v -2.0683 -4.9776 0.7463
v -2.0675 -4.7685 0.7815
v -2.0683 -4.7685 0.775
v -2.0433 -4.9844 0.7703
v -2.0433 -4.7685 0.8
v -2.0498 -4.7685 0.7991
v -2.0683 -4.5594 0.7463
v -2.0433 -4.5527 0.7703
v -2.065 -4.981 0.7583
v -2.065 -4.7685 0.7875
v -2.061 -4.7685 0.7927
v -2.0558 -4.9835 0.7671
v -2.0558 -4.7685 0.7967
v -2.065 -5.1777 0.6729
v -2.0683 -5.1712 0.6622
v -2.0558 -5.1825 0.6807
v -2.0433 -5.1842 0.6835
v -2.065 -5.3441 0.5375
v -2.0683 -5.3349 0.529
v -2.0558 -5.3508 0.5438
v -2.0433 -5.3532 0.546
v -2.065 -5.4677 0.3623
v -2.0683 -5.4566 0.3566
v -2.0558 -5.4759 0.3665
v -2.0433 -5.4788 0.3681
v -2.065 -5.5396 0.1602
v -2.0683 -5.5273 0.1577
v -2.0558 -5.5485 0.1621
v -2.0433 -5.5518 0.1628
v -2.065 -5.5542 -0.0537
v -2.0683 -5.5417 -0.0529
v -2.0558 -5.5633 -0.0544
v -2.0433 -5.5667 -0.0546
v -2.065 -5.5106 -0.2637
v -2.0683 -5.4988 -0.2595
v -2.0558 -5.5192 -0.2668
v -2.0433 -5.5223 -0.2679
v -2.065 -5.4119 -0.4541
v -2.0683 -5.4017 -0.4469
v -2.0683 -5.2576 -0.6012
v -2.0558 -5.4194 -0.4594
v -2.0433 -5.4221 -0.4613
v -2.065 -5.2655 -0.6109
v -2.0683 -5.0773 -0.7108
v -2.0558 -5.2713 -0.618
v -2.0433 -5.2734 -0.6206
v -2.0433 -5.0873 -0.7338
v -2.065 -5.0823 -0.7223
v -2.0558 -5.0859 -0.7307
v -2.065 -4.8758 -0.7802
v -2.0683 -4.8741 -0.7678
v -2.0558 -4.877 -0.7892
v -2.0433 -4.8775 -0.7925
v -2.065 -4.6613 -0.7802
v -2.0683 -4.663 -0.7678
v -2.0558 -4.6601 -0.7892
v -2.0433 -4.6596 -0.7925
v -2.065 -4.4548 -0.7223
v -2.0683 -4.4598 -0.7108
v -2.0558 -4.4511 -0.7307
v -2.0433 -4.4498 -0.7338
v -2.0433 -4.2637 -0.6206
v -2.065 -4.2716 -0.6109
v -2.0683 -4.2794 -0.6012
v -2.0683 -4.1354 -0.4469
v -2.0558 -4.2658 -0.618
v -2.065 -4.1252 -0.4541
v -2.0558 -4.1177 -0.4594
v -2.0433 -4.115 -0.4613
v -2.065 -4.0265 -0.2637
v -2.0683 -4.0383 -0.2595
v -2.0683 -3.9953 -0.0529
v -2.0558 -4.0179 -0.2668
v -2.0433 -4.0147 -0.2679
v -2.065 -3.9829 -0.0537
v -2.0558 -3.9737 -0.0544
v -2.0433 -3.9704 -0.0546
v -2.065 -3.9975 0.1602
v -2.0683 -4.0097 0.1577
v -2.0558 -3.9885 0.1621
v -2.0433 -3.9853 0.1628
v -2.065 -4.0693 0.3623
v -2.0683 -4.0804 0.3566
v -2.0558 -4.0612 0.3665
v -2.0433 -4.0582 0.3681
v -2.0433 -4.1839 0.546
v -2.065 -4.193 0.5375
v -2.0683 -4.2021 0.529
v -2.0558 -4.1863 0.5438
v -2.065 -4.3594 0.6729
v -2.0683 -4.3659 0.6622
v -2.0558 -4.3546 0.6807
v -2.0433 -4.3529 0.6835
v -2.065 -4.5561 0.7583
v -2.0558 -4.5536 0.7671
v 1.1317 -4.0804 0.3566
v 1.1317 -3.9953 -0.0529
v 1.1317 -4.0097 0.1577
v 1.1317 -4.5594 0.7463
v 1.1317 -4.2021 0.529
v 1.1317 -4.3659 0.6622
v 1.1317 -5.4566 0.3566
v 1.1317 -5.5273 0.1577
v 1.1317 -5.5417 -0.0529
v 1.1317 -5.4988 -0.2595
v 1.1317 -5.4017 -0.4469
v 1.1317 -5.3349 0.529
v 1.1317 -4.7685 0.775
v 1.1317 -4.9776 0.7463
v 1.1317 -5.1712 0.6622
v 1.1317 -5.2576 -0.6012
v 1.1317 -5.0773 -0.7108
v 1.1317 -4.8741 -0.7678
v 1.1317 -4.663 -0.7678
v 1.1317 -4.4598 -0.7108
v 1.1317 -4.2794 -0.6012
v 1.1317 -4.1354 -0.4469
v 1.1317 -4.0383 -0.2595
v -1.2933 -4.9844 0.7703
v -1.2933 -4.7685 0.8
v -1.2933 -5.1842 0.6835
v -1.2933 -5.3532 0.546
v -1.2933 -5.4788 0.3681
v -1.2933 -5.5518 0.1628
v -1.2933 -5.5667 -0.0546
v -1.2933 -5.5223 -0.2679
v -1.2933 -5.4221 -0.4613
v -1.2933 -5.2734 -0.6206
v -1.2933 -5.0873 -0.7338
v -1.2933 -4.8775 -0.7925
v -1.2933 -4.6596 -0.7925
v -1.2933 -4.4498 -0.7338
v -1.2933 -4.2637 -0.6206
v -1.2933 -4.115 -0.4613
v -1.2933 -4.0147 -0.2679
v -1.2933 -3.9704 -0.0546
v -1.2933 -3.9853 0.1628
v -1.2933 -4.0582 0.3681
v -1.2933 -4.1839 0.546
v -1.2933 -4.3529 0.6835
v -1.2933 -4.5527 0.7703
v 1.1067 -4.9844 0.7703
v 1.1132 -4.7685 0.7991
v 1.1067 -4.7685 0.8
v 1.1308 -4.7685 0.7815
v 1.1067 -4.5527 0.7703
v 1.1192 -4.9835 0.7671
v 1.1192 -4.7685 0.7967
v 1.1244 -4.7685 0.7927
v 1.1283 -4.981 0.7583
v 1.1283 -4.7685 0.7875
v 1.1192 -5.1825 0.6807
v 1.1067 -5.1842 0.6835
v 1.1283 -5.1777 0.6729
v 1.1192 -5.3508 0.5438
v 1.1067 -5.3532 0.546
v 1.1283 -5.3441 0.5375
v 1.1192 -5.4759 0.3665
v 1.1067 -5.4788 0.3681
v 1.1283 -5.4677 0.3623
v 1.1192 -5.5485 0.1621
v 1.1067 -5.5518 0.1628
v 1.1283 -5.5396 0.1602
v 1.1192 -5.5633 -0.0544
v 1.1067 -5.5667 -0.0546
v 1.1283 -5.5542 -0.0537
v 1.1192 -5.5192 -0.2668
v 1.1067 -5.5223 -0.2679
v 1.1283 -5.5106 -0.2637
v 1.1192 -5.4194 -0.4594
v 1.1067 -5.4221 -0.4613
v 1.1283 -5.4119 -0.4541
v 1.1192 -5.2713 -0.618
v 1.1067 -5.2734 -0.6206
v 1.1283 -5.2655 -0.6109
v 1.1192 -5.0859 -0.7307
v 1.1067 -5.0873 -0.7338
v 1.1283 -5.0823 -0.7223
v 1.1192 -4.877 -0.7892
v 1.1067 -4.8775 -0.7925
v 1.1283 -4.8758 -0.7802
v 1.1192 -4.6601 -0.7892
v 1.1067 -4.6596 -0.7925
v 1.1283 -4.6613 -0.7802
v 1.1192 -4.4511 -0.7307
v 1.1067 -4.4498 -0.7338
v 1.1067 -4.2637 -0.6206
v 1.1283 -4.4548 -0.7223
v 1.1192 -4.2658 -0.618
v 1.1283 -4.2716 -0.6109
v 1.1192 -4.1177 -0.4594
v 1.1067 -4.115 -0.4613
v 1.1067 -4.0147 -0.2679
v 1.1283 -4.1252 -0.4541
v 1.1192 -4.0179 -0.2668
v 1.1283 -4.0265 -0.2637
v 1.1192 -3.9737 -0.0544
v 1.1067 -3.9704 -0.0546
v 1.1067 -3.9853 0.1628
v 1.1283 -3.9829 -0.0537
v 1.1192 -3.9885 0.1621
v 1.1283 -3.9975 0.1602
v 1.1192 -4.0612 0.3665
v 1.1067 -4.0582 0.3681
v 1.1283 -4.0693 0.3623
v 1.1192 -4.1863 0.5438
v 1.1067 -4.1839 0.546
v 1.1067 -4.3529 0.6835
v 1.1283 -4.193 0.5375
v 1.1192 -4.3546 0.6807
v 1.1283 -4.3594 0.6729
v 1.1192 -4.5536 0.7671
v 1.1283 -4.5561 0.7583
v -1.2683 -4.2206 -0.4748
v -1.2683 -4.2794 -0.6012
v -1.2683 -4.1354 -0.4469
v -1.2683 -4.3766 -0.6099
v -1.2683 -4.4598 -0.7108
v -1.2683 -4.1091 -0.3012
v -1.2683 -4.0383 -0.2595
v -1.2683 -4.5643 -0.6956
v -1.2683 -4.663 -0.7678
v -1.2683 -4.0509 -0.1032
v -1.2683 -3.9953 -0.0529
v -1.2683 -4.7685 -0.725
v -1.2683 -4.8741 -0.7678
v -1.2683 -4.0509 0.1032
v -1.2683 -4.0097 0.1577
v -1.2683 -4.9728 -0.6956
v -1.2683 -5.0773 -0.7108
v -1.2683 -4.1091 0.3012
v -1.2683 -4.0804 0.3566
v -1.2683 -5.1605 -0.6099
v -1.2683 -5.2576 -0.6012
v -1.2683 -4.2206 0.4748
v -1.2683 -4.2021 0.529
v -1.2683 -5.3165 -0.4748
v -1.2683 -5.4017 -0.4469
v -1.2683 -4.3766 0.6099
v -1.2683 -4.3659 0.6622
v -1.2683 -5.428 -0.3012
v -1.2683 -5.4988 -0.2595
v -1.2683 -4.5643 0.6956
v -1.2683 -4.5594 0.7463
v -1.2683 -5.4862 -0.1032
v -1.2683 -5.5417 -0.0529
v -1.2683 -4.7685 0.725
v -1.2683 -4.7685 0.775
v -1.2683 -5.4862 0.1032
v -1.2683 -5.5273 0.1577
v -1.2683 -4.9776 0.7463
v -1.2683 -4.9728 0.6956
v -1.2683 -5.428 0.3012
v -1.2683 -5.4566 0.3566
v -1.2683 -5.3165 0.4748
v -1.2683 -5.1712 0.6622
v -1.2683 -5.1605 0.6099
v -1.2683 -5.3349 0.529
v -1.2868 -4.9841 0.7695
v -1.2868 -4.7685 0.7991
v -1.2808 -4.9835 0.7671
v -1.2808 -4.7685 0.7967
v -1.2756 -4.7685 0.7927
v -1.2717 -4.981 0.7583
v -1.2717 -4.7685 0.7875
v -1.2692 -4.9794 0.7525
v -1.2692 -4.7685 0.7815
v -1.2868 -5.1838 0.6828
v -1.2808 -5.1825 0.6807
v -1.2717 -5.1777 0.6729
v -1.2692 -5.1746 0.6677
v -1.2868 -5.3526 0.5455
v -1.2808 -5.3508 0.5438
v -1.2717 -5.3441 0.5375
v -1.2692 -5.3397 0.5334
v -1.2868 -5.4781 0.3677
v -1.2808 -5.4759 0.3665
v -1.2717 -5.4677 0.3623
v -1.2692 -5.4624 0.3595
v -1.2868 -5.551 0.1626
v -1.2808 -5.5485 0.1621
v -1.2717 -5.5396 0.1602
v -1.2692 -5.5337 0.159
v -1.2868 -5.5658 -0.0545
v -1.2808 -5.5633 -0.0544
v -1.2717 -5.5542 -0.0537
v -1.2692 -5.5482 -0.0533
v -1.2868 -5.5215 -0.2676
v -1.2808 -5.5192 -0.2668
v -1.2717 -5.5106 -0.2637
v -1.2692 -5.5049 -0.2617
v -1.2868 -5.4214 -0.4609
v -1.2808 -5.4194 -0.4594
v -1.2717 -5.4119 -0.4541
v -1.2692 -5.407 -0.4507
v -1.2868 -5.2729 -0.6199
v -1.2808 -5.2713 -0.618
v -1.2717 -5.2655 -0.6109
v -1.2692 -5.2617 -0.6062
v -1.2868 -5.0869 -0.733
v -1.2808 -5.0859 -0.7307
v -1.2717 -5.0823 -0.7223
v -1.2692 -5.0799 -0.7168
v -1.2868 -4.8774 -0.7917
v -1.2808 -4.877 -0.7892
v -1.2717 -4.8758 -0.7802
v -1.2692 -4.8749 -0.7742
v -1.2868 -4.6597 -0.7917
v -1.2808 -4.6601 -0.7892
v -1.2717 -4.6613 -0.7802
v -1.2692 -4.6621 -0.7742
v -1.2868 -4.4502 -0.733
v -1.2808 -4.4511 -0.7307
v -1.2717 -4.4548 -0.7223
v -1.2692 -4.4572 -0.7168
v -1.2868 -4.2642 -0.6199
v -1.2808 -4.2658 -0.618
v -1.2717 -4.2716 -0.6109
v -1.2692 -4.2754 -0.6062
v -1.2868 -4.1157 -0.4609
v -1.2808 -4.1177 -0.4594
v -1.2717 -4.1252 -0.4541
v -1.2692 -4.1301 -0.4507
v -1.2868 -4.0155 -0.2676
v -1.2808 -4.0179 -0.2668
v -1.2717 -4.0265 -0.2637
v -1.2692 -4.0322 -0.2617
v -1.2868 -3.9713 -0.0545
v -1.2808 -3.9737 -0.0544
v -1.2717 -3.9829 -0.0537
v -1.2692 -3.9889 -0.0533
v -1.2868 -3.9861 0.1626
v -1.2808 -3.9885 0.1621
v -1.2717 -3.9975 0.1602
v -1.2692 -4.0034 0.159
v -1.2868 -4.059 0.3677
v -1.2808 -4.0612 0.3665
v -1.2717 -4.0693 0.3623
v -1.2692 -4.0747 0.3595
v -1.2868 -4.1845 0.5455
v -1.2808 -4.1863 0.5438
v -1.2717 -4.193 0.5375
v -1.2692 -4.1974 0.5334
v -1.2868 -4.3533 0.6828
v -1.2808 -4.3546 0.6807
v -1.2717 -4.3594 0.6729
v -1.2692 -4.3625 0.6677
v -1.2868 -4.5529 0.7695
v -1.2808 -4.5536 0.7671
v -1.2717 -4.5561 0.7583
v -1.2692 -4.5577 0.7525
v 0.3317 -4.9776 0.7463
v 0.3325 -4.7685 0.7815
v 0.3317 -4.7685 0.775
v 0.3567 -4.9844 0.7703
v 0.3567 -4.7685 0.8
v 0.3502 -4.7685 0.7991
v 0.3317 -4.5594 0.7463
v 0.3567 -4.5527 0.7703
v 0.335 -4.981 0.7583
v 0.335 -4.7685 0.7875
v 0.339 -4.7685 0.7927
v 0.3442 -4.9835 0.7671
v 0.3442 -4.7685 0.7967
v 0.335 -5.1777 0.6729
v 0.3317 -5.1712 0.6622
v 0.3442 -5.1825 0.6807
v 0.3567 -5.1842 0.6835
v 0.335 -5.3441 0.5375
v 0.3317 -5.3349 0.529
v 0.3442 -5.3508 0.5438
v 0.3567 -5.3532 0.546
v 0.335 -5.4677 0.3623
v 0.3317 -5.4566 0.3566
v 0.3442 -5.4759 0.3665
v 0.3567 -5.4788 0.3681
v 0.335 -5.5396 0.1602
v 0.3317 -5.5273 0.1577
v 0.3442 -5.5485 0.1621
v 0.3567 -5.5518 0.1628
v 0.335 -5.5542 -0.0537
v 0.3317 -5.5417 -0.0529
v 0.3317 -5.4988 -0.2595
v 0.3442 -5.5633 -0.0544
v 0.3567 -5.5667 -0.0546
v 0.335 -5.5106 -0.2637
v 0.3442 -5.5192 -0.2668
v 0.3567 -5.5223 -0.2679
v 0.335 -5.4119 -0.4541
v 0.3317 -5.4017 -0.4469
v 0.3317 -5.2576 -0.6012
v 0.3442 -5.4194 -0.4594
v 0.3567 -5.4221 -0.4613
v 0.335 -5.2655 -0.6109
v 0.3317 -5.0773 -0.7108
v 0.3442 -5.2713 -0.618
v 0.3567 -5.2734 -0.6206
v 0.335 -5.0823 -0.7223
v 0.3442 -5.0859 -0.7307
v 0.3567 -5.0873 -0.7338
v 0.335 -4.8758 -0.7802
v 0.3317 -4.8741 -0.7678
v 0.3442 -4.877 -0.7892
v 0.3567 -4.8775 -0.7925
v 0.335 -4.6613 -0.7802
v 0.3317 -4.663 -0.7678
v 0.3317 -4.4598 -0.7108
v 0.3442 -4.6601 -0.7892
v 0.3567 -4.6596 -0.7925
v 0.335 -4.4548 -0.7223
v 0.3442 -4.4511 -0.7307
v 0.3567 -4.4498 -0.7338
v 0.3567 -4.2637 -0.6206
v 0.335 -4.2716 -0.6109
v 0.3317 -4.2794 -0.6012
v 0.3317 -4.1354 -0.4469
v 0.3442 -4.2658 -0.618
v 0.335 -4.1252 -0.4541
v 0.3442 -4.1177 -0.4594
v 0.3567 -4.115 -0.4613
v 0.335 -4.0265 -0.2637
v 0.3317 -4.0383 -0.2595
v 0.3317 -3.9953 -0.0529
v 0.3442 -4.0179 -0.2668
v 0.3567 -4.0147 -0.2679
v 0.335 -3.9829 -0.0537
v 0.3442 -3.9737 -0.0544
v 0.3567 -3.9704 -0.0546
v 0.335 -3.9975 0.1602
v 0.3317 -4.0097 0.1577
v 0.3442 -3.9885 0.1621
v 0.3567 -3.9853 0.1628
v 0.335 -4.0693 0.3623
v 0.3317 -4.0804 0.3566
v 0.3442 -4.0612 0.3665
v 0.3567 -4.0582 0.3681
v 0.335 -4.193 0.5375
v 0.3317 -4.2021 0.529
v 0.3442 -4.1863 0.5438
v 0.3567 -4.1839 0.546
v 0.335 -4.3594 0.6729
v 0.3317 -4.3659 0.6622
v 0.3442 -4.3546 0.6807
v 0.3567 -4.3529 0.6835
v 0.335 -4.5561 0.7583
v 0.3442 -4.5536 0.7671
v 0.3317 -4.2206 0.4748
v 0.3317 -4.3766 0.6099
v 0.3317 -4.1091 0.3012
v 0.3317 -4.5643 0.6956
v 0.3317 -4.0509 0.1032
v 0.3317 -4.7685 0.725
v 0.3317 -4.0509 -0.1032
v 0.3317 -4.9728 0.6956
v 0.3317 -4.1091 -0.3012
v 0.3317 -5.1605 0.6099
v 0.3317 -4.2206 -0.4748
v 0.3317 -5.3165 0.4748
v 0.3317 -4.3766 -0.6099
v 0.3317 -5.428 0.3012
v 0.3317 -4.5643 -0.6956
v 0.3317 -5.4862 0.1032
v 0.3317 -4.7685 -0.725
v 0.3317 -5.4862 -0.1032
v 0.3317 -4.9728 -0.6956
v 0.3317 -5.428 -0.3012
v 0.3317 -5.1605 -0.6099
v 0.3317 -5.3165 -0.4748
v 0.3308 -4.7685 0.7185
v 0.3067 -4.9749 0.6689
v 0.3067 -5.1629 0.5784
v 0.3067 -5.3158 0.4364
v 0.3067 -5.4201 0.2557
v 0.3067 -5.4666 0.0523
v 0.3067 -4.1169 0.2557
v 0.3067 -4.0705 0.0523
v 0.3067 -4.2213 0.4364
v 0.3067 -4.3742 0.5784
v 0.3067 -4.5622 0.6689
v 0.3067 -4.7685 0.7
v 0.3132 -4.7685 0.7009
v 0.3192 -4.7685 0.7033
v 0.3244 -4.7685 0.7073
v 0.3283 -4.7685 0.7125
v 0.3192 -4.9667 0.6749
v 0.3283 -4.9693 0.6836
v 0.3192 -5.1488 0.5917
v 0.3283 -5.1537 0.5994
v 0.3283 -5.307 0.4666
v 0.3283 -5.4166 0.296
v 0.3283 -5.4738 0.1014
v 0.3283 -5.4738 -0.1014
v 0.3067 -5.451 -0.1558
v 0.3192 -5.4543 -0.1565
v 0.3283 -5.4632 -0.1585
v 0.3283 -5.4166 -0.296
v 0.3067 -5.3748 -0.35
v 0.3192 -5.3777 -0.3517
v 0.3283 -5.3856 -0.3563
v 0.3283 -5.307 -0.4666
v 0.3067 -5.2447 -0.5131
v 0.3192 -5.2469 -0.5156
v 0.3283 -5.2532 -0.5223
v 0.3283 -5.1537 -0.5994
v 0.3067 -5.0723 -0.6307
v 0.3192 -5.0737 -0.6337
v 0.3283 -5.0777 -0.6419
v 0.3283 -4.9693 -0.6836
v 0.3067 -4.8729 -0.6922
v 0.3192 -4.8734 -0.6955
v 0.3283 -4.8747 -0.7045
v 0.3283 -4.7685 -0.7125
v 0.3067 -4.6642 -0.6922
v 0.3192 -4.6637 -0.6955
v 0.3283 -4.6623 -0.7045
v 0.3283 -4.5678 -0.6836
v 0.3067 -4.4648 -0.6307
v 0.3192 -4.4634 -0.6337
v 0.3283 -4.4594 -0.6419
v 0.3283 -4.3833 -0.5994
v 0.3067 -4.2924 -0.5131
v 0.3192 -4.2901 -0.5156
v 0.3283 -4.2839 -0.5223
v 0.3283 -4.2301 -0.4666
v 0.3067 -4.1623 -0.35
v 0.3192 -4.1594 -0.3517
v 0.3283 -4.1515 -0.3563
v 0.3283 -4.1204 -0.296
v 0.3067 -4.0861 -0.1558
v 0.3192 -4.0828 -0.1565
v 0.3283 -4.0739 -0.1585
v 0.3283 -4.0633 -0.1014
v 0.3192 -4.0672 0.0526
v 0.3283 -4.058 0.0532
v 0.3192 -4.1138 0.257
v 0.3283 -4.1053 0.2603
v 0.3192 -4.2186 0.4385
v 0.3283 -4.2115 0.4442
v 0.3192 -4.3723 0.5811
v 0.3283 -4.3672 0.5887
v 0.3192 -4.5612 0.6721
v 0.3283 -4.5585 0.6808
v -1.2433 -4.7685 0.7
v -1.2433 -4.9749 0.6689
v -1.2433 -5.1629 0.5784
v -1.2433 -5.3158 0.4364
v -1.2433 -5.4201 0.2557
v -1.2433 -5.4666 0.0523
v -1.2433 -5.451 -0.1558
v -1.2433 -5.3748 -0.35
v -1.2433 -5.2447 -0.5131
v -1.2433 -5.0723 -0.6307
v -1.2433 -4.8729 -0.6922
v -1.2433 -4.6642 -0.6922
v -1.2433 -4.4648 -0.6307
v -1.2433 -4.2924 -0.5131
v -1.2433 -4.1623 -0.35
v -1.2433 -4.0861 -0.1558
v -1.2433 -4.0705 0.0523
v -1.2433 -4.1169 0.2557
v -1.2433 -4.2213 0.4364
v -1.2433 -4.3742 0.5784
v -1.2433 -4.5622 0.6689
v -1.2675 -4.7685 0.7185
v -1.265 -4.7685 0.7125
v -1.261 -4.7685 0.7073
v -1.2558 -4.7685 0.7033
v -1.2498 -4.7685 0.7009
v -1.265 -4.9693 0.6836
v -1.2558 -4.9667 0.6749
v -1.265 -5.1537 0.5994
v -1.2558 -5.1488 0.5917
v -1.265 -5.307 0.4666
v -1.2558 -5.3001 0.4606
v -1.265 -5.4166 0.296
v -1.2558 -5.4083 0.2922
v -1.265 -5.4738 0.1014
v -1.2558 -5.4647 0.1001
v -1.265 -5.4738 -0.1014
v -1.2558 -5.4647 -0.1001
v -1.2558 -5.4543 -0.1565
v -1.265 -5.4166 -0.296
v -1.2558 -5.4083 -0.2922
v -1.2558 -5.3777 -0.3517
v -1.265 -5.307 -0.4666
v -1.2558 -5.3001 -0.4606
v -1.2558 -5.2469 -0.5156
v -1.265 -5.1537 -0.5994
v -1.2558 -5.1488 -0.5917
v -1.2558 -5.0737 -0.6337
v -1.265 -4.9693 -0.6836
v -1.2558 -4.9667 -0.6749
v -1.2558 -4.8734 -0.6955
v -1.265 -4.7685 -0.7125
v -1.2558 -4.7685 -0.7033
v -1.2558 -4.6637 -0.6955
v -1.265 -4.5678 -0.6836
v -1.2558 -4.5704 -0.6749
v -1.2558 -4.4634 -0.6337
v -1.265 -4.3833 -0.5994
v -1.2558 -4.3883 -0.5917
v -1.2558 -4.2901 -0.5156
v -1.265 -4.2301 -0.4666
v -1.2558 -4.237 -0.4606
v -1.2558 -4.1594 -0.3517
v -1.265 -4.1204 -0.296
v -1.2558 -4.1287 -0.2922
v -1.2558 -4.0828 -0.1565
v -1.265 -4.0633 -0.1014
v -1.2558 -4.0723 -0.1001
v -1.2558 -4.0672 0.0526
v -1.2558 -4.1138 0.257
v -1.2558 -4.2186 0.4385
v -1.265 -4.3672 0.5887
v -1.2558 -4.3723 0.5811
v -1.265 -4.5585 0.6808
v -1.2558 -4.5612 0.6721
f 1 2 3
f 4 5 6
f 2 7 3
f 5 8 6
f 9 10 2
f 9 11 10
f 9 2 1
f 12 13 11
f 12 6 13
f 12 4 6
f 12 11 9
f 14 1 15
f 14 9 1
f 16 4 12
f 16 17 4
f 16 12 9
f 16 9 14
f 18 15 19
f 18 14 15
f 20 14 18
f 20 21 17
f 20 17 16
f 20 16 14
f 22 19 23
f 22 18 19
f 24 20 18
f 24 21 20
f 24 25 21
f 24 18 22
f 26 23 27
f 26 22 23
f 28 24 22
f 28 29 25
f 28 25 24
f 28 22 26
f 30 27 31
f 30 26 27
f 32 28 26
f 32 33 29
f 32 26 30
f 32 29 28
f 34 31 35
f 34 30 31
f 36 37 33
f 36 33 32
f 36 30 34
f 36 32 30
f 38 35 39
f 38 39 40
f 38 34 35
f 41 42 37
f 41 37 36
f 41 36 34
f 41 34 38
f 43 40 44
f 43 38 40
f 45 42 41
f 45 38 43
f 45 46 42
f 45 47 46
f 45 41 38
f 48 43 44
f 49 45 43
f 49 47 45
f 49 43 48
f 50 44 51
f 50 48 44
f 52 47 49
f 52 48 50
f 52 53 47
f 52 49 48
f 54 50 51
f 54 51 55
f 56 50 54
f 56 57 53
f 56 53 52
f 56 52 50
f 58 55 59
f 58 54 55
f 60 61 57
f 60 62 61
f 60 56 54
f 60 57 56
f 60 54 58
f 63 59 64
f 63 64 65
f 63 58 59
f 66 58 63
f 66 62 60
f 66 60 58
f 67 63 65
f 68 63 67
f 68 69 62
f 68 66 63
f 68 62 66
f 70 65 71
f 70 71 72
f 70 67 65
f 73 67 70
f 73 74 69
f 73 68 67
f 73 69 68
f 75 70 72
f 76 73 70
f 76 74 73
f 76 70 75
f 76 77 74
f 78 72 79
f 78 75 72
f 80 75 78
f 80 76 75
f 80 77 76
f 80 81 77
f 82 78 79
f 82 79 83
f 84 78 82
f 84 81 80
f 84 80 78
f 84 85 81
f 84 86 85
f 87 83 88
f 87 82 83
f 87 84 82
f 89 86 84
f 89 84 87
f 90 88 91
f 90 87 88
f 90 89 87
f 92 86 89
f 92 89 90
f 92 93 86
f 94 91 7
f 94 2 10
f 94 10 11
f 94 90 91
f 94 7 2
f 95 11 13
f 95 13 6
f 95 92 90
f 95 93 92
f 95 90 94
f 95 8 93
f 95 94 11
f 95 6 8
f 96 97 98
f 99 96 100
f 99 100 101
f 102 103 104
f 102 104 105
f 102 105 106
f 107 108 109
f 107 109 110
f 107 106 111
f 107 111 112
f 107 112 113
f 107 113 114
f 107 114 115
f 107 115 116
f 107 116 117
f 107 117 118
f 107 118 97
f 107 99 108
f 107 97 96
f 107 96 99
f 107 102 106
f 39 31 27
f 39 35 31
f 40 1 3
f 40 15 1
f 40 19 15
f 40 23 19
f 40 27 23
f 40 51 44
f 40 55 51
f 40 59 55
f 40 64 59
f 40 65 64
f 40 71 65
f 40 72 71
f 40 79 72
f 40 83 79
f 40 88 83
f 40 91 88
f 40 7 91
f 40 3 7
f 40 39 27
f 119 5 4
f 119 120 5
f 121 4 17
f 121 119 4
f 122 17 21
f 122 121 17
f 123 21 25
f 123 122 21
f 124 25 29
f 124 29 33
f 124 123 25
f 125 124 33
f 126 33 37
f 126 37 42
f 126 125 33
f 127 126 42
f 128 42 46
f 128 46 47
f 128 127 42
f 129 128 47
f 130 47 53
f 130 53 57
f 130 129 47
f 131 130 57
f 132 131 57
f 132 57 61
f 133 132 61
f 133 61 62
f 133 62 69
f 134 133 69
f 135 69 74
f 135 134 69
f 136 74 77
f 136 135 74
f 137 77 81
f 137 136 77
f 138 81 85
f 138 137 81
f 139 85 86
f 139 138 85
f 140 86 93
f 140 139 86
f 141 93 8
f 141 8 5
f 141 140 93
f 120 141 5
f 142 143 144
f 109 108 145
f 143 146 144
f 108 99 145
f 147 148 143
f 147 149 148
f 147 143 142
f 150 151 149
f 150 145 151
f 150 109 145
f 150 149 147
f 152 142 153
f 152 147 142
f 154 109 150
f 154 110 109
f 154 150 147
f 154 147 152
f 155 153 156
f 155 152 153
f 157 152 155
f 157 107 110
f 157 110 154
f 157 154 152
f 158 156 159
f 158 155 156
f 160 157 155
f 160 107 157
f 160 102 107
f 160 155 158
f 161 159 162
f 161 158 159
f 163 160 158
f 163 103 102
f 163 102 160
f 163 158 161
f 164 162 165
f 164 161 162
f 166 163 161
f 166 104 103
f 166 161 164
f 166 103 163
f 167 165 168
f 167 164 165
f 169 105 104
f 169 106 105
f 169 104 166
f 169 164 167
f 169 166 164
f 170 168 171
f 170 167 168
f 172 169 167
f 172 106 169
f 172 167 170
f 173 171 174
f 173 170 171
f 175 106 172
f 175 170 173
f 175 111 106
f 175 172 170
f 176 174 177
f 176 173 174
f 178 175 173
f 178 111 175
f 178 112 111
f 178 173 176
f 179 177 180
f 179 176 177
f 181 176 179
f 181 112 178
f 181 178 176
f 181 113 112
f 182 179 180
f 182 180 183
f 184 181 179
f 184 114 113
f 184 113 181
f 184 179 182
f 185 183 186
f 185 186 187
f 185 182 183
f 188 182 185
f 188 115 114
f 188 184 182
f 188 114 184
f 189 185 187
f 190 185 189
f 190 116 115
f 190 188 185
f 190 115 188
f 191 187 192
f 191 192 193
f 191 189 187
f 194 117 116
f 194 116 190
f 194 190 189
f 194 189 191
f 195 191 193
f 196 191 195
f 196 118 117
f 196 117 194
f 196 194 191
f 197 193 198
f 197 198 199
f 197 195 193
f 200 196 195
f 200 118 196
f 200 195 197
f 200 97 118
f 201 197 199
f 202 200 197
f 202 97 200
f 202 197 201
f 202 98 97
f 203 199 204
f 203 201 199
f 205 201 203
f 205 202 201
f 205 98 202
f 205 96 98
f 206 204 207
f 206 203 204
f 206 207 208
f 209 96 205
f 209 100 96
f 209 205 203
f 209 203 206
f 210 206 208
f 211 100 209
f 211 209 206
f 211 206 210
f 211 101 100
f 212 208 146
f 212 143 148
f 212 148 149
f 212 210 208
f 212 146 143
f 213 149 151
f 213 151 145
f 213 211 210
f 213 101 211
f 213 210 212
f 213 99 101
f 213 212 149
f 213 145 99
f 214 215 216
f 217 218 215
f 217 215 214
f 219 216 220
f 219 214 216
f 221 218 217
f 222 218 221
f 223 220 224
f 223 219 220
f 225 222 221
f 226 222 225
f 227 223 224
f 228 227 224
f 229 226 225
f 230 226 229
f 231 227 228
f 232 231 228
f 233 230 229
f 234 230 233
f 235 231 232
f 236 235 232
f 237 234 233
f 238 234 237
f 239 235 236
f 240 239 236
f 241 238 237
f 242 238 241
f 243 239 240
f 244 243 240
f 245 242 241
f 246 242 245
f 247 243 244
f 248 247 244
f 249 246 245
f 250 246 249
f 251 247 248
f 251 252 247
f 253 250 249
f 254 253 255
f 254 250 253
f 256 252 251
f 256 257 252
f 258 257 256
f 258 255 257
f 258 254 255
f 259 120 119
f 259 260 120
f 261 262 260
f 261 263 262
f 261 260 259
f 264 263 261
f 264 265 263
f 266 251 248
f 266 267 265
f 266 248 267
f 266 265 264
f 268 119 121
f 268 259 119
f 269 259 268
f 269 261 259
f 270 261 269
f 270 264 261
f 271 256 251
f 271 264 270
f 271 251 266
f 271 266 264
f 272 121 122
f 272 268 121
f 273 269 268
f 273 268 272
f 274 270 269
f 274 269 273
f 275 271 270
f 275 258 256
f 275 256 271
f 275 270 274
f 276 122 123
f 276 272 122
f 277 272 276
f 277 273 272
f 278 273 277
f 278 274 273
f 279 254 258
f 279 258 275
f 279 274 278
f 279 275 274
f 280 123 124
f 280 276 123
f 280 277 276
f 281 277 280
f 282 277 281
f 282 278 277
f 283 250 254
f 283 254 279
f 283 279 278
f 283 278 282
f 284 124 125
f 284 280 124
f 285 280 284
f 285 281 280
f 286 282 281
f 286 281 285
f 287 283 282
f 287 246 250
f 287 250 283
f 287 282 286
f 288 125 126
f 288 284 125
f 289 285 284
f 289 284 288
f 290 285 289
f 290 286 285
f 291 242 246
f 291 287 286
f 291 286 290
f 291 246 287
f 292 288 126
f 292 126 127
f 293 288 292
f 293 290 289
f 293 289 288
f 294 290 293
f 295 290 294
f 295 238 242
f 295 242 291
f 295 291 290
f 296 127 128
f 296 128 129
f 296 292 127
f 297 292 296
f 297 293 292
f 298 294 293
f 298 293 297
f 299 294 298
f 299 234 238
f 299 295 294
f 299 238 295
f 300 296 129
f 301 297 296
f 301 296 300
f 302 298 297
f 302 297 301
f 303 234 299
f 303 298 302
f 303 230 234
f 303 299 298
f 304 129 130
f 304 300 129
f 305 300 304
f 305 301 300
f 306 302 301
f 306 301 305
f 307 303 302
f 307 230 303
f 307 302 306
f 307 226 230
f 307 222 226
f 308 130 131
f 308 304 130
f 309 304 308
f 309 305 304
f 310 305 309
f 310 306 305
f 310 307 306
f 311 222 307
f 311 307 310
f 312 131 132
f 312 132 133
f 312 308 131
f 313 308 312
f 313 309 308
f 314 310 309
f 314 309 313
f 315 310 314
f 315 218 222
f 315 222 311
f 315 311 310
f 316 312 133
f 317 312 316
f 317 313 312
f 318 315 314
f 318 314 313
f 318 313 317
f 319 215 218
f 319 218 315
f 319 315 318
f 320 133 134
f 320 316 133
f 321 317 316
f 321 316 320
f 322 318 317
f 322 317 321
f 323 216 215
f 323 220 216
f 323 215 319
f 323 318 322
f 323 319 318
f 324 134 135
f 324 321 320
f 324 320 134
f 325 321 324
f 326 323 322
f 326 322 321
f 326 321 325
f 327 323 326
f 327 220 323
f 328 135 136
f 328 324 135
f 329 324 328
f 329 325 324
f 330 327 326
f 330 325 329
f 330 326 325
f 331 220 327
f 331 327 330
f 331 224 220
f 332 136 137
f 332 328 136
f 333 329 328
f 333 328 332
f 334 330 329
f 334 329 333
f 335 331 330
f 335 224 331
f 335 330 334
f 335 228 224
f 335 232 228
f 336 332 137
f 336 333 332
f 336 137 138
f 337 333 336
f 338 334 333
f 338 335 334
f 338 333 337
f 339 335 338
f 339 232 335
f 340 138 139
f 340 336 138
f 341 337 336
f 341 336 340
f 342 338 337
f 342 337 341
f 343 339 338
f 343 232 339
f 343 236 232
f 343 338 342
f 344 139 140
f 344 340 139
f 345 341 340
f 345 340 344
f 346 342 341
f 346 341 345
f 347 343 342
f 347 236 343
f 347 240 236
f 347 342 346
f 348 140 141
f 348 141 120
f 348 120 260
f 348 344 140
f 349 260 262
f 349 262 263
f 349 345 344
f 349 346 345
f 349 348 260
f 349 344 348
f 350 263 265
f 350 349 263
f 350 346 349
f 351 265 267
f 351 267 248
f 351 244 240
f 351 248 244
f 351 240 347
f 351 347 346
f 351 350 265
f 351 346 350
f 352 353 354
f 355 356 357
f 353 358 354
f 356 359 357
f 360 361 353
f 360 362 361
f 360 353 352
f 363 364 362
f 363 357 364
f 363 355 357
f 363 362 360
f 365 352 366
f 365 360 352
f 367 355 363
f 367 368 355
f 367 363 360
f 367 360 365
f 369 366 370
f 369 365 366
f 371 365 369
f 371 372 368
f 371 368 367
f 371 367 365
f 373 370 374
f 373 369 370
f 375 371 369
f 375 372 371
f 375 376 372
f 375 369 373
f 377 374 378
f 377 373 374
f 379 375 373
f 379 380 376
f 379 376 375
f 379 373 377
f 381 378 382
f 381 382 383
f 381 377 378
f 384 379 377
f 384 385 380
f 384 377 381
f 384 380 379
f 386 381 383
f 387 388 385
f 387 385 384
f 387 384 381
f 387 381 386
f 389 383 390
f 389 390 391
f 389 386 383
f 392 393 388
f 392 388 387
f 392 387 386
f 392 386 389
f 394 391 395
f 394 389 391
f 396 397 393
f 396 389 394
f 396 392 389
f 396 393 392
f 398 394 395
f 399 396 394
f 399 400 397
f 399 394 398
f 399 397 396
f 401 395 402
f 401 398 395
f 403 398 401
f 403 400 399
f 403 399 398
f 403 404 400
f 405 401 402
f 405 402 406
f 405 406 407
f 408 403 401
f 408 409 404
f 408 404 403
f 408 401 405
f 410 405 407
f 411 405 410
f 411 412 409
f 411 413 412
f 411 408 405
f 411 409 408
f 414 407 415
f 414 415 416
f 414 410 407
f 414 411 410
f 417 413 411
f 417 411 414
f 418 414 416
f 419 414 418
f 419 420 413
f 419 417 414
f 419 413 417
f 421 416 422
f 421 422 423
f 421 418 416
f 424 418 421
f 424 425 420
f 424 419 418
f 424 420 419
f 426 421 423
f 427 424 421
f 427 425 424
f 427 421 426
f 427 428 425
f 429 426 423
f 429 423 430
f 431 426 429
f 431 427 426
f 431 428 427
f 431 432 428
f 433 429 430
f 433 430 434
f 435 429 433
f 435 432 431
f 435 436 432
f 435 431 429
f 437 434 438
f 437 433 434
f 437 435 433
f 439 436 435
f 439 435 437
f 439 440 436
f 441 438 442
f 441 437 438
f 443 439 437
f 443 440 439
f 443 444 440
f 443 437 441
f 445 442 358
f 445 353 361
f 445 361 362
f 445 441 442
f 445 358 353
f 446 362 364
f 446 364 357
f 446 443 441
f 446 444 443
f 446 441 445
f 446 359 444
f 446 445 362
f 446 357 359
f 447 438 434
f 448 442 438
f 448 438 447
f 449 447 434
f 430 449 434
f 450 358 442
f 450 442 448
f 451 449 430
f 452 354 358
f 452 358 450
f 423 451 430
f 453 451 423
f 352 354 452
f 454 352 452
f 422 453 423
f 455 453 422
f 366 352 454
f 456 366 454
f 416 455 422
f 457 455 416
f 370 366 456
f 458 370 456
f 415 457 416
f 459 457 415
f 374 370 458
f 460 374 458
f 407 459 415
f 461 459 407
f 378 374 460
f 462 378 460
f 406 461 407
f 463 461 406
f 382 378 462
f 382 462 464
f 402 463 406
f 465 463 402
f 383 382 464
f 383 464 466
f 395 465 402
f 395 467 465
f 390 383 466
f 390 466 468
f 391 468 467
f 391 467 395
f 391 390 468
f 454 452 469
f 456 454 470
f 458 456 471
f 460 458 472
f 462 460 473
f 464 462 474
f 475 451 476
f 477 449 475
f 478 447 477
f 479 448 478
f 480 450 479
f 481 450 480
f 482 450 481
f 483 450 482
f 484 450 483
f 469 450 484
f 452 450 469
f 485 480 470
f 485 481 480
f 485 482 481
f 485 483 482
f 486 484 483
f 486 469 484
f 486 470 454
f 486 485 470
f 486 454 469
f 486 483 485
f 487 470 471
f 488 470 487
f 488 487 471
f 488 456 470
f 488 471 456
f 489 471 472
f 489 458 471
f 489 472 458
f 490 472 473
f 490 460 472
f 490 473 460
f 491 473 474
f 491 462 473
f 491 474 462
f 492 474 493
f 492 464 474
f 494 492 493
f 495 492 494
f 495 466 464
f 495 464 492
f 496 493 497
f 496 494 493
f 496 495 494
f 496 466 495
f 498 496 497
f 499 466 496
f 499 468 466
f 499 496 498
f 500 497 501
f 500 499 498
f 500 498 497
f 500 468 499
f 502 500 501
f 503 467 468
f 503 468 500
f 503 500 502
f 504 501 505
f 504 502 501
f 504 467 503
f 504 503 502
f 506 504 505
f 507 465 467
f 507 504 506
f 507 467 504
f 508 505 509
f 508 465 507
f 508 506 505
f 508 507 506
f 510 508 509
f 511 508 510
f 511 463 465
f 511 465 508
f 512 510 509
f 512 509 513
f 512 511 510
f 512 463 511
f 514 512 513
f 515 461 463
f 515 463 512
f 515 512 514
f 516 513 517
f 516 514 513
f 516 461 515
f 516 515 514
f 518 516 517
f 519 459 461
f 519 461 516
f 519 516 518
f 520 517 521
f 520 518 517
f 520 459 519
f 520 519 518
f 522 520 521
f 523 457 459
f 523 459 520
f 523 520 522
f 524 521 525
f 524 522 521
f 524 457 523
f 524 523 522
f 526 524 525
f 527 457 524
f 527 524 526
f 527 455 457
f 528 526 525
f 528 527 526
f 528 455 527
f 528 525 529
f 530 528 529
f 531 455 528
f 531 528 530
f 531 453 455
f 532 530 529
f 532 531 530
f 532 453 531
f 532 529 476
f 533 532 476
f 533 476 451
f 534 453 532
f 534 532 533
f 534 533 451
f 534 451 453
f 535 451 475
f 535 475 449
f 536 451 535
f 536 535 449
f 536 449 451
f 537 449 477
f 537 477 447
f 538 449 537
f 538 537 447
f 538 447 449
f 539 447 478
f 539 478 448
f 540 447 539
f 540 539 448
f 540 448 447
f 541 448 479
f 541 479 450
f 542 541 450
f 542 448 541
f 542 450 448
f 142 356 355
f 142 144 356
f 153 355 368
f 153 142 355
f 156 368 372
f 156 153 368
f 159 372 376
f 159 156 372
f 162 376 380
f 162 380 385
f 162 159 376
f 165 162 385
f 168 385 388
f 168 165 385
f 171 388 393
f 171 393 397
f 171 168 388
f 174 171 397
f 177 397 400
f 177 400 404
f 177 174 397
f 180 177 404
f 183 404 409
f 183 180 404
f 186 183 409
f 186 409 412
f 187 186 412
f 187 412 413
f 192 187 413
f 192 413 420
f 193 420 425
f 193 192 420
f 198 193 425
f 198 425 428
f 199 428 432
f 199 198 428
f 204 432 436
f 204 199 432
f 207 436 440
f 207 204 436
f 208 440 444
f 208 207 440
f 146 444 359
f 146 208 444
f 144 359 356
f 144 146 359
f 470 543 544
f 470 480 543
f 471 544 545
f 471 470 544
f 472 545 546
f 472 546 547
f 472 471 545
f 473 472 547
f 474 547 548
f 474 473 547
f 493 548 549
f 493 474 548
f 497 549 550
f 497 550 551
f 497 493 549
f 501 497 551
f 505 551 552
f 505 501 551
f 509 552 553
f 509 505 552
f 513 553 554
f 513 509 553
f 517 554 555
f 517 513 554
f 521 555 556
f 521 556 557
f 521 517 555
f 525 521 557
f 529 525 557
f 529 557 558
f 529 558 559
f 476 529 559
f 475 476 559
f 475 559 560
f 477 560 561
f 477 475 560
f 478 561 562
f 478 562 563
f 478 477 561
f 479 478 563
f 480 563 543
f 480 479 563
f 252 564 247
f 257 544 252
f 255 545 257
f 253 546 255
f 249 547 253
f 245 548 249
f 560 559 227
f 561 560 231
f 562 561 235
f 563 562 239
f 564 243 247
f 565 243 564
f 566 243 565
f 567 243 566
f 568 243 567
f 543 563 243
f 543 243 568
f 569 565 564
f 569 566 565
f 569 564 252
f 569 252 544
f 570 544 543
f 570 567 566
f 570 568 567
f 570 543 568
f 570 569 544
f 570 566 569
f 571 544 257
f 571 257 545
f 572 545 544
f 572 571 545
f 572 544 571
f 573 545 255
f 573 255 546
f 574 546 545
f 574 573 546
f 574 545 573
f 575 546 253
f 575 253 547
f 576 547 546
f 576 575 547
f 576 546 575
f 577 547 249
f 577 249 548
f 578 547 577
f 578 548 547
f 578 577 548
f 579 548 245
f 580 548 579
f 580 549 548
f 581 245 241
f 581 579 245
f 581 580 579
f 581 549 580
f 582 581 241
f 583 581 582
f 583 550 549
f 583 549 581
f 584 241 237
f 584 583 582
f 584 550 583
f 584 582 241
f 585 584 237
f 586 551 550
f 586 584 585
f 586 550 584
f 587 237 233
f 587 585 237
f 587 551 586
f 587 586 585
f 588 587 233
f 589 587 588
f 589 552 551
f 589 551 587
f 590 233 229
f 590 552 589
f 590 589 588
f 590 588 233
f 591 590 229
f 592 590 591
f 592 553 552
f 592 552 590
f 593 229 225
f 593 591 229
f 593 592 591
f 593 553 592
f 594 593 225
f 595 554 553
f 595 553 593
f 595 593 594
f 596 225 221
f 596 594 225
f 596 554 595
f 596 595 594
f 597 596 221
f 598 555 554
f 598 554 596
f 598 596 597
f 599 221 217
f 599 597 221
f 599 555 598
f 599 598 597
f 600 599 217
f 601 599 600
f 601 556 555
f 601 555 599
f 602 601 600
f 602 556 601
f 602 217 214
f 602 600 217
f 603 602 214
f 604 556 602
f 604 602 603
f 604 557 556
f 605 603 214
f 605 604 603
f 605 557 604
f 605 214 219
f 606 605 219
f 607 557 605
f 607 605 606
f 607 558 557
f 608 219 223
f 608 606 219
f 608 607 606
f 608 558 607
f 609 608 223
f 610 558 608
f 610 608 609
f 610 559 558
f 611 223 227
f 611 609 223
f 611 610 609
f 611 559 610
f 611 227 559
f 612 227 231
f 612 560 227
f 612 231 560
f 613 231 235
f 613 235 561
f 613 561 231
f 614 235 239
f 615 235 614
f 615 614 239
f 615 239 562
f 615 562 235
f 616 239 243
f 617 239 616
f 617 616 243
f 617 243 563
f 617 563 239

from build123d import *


with BuildPart() as part:
    # 草图1 → 旋转3 (revolve)
    with BuildSketch(Plane.XY, mode=Mode.PRIVATE) as revolve_3_sk:
        with BuildLine():
            Line((-2.043313513, -3.968536382), (-1.293313513, -3.968536382))
            ThreePointArc((-1.293313513, -3.968536382), (-1.275635844, -3.975858712), (-1.268313513, -3.993536382))
            Line((-1.268313513, -3.993536382), (-1.268313513, -4.043536382))
            ThreePointArc((-1.268313513, -4.043536382), (-1.260991183, -4.061214051), (-1.243313513, -4.068536382))
            Line((-1.243313513, -4.068536382), (0.306686487, -4.068536382))
            ThreePointArc((0.306686487, -4.068536382), (0.324364156, -4.061214051), (0.331686487, -4.043536382))
            Line((0.331686487, -4.043536382), (0.331686487, -3.993536382))
            ThreePointArc((0.331686487, -3.993536382), (0.339008817, -3.975858712), (0.356686487, -3.968536382))
            Line((0.356686487, -3.968536382), (1.106686487, -3.968536382))
            ThreePointArc((1.106686487, -3.968536382), (1.124364156, -3.975858712), (1.131686487, -3.993536382))
            Line((1.131686487, -3.993536382), (1.131686487, -4.768536382))
            Line((1.131686487, -4.768536382), (-2.068313513, -4.768536382))
            Line((-2.068313513, -4.768536382), (-2.068313513, -3.993536382))
            ThreePointArc((-2.068313513, -3.993536382), (-2.060991183, -3.975858712), (-2.043313513, -3.968536382))
        make_face()
    revolve(revolve_3_sk.sketch.rotate(Axis((-2.068313513, -4.768536382, 0), (1, 0, 0)), 90), axis=Axis((-2.068313513, -4.768536382, 0), (1, 0, 0)))


solid = part.part
